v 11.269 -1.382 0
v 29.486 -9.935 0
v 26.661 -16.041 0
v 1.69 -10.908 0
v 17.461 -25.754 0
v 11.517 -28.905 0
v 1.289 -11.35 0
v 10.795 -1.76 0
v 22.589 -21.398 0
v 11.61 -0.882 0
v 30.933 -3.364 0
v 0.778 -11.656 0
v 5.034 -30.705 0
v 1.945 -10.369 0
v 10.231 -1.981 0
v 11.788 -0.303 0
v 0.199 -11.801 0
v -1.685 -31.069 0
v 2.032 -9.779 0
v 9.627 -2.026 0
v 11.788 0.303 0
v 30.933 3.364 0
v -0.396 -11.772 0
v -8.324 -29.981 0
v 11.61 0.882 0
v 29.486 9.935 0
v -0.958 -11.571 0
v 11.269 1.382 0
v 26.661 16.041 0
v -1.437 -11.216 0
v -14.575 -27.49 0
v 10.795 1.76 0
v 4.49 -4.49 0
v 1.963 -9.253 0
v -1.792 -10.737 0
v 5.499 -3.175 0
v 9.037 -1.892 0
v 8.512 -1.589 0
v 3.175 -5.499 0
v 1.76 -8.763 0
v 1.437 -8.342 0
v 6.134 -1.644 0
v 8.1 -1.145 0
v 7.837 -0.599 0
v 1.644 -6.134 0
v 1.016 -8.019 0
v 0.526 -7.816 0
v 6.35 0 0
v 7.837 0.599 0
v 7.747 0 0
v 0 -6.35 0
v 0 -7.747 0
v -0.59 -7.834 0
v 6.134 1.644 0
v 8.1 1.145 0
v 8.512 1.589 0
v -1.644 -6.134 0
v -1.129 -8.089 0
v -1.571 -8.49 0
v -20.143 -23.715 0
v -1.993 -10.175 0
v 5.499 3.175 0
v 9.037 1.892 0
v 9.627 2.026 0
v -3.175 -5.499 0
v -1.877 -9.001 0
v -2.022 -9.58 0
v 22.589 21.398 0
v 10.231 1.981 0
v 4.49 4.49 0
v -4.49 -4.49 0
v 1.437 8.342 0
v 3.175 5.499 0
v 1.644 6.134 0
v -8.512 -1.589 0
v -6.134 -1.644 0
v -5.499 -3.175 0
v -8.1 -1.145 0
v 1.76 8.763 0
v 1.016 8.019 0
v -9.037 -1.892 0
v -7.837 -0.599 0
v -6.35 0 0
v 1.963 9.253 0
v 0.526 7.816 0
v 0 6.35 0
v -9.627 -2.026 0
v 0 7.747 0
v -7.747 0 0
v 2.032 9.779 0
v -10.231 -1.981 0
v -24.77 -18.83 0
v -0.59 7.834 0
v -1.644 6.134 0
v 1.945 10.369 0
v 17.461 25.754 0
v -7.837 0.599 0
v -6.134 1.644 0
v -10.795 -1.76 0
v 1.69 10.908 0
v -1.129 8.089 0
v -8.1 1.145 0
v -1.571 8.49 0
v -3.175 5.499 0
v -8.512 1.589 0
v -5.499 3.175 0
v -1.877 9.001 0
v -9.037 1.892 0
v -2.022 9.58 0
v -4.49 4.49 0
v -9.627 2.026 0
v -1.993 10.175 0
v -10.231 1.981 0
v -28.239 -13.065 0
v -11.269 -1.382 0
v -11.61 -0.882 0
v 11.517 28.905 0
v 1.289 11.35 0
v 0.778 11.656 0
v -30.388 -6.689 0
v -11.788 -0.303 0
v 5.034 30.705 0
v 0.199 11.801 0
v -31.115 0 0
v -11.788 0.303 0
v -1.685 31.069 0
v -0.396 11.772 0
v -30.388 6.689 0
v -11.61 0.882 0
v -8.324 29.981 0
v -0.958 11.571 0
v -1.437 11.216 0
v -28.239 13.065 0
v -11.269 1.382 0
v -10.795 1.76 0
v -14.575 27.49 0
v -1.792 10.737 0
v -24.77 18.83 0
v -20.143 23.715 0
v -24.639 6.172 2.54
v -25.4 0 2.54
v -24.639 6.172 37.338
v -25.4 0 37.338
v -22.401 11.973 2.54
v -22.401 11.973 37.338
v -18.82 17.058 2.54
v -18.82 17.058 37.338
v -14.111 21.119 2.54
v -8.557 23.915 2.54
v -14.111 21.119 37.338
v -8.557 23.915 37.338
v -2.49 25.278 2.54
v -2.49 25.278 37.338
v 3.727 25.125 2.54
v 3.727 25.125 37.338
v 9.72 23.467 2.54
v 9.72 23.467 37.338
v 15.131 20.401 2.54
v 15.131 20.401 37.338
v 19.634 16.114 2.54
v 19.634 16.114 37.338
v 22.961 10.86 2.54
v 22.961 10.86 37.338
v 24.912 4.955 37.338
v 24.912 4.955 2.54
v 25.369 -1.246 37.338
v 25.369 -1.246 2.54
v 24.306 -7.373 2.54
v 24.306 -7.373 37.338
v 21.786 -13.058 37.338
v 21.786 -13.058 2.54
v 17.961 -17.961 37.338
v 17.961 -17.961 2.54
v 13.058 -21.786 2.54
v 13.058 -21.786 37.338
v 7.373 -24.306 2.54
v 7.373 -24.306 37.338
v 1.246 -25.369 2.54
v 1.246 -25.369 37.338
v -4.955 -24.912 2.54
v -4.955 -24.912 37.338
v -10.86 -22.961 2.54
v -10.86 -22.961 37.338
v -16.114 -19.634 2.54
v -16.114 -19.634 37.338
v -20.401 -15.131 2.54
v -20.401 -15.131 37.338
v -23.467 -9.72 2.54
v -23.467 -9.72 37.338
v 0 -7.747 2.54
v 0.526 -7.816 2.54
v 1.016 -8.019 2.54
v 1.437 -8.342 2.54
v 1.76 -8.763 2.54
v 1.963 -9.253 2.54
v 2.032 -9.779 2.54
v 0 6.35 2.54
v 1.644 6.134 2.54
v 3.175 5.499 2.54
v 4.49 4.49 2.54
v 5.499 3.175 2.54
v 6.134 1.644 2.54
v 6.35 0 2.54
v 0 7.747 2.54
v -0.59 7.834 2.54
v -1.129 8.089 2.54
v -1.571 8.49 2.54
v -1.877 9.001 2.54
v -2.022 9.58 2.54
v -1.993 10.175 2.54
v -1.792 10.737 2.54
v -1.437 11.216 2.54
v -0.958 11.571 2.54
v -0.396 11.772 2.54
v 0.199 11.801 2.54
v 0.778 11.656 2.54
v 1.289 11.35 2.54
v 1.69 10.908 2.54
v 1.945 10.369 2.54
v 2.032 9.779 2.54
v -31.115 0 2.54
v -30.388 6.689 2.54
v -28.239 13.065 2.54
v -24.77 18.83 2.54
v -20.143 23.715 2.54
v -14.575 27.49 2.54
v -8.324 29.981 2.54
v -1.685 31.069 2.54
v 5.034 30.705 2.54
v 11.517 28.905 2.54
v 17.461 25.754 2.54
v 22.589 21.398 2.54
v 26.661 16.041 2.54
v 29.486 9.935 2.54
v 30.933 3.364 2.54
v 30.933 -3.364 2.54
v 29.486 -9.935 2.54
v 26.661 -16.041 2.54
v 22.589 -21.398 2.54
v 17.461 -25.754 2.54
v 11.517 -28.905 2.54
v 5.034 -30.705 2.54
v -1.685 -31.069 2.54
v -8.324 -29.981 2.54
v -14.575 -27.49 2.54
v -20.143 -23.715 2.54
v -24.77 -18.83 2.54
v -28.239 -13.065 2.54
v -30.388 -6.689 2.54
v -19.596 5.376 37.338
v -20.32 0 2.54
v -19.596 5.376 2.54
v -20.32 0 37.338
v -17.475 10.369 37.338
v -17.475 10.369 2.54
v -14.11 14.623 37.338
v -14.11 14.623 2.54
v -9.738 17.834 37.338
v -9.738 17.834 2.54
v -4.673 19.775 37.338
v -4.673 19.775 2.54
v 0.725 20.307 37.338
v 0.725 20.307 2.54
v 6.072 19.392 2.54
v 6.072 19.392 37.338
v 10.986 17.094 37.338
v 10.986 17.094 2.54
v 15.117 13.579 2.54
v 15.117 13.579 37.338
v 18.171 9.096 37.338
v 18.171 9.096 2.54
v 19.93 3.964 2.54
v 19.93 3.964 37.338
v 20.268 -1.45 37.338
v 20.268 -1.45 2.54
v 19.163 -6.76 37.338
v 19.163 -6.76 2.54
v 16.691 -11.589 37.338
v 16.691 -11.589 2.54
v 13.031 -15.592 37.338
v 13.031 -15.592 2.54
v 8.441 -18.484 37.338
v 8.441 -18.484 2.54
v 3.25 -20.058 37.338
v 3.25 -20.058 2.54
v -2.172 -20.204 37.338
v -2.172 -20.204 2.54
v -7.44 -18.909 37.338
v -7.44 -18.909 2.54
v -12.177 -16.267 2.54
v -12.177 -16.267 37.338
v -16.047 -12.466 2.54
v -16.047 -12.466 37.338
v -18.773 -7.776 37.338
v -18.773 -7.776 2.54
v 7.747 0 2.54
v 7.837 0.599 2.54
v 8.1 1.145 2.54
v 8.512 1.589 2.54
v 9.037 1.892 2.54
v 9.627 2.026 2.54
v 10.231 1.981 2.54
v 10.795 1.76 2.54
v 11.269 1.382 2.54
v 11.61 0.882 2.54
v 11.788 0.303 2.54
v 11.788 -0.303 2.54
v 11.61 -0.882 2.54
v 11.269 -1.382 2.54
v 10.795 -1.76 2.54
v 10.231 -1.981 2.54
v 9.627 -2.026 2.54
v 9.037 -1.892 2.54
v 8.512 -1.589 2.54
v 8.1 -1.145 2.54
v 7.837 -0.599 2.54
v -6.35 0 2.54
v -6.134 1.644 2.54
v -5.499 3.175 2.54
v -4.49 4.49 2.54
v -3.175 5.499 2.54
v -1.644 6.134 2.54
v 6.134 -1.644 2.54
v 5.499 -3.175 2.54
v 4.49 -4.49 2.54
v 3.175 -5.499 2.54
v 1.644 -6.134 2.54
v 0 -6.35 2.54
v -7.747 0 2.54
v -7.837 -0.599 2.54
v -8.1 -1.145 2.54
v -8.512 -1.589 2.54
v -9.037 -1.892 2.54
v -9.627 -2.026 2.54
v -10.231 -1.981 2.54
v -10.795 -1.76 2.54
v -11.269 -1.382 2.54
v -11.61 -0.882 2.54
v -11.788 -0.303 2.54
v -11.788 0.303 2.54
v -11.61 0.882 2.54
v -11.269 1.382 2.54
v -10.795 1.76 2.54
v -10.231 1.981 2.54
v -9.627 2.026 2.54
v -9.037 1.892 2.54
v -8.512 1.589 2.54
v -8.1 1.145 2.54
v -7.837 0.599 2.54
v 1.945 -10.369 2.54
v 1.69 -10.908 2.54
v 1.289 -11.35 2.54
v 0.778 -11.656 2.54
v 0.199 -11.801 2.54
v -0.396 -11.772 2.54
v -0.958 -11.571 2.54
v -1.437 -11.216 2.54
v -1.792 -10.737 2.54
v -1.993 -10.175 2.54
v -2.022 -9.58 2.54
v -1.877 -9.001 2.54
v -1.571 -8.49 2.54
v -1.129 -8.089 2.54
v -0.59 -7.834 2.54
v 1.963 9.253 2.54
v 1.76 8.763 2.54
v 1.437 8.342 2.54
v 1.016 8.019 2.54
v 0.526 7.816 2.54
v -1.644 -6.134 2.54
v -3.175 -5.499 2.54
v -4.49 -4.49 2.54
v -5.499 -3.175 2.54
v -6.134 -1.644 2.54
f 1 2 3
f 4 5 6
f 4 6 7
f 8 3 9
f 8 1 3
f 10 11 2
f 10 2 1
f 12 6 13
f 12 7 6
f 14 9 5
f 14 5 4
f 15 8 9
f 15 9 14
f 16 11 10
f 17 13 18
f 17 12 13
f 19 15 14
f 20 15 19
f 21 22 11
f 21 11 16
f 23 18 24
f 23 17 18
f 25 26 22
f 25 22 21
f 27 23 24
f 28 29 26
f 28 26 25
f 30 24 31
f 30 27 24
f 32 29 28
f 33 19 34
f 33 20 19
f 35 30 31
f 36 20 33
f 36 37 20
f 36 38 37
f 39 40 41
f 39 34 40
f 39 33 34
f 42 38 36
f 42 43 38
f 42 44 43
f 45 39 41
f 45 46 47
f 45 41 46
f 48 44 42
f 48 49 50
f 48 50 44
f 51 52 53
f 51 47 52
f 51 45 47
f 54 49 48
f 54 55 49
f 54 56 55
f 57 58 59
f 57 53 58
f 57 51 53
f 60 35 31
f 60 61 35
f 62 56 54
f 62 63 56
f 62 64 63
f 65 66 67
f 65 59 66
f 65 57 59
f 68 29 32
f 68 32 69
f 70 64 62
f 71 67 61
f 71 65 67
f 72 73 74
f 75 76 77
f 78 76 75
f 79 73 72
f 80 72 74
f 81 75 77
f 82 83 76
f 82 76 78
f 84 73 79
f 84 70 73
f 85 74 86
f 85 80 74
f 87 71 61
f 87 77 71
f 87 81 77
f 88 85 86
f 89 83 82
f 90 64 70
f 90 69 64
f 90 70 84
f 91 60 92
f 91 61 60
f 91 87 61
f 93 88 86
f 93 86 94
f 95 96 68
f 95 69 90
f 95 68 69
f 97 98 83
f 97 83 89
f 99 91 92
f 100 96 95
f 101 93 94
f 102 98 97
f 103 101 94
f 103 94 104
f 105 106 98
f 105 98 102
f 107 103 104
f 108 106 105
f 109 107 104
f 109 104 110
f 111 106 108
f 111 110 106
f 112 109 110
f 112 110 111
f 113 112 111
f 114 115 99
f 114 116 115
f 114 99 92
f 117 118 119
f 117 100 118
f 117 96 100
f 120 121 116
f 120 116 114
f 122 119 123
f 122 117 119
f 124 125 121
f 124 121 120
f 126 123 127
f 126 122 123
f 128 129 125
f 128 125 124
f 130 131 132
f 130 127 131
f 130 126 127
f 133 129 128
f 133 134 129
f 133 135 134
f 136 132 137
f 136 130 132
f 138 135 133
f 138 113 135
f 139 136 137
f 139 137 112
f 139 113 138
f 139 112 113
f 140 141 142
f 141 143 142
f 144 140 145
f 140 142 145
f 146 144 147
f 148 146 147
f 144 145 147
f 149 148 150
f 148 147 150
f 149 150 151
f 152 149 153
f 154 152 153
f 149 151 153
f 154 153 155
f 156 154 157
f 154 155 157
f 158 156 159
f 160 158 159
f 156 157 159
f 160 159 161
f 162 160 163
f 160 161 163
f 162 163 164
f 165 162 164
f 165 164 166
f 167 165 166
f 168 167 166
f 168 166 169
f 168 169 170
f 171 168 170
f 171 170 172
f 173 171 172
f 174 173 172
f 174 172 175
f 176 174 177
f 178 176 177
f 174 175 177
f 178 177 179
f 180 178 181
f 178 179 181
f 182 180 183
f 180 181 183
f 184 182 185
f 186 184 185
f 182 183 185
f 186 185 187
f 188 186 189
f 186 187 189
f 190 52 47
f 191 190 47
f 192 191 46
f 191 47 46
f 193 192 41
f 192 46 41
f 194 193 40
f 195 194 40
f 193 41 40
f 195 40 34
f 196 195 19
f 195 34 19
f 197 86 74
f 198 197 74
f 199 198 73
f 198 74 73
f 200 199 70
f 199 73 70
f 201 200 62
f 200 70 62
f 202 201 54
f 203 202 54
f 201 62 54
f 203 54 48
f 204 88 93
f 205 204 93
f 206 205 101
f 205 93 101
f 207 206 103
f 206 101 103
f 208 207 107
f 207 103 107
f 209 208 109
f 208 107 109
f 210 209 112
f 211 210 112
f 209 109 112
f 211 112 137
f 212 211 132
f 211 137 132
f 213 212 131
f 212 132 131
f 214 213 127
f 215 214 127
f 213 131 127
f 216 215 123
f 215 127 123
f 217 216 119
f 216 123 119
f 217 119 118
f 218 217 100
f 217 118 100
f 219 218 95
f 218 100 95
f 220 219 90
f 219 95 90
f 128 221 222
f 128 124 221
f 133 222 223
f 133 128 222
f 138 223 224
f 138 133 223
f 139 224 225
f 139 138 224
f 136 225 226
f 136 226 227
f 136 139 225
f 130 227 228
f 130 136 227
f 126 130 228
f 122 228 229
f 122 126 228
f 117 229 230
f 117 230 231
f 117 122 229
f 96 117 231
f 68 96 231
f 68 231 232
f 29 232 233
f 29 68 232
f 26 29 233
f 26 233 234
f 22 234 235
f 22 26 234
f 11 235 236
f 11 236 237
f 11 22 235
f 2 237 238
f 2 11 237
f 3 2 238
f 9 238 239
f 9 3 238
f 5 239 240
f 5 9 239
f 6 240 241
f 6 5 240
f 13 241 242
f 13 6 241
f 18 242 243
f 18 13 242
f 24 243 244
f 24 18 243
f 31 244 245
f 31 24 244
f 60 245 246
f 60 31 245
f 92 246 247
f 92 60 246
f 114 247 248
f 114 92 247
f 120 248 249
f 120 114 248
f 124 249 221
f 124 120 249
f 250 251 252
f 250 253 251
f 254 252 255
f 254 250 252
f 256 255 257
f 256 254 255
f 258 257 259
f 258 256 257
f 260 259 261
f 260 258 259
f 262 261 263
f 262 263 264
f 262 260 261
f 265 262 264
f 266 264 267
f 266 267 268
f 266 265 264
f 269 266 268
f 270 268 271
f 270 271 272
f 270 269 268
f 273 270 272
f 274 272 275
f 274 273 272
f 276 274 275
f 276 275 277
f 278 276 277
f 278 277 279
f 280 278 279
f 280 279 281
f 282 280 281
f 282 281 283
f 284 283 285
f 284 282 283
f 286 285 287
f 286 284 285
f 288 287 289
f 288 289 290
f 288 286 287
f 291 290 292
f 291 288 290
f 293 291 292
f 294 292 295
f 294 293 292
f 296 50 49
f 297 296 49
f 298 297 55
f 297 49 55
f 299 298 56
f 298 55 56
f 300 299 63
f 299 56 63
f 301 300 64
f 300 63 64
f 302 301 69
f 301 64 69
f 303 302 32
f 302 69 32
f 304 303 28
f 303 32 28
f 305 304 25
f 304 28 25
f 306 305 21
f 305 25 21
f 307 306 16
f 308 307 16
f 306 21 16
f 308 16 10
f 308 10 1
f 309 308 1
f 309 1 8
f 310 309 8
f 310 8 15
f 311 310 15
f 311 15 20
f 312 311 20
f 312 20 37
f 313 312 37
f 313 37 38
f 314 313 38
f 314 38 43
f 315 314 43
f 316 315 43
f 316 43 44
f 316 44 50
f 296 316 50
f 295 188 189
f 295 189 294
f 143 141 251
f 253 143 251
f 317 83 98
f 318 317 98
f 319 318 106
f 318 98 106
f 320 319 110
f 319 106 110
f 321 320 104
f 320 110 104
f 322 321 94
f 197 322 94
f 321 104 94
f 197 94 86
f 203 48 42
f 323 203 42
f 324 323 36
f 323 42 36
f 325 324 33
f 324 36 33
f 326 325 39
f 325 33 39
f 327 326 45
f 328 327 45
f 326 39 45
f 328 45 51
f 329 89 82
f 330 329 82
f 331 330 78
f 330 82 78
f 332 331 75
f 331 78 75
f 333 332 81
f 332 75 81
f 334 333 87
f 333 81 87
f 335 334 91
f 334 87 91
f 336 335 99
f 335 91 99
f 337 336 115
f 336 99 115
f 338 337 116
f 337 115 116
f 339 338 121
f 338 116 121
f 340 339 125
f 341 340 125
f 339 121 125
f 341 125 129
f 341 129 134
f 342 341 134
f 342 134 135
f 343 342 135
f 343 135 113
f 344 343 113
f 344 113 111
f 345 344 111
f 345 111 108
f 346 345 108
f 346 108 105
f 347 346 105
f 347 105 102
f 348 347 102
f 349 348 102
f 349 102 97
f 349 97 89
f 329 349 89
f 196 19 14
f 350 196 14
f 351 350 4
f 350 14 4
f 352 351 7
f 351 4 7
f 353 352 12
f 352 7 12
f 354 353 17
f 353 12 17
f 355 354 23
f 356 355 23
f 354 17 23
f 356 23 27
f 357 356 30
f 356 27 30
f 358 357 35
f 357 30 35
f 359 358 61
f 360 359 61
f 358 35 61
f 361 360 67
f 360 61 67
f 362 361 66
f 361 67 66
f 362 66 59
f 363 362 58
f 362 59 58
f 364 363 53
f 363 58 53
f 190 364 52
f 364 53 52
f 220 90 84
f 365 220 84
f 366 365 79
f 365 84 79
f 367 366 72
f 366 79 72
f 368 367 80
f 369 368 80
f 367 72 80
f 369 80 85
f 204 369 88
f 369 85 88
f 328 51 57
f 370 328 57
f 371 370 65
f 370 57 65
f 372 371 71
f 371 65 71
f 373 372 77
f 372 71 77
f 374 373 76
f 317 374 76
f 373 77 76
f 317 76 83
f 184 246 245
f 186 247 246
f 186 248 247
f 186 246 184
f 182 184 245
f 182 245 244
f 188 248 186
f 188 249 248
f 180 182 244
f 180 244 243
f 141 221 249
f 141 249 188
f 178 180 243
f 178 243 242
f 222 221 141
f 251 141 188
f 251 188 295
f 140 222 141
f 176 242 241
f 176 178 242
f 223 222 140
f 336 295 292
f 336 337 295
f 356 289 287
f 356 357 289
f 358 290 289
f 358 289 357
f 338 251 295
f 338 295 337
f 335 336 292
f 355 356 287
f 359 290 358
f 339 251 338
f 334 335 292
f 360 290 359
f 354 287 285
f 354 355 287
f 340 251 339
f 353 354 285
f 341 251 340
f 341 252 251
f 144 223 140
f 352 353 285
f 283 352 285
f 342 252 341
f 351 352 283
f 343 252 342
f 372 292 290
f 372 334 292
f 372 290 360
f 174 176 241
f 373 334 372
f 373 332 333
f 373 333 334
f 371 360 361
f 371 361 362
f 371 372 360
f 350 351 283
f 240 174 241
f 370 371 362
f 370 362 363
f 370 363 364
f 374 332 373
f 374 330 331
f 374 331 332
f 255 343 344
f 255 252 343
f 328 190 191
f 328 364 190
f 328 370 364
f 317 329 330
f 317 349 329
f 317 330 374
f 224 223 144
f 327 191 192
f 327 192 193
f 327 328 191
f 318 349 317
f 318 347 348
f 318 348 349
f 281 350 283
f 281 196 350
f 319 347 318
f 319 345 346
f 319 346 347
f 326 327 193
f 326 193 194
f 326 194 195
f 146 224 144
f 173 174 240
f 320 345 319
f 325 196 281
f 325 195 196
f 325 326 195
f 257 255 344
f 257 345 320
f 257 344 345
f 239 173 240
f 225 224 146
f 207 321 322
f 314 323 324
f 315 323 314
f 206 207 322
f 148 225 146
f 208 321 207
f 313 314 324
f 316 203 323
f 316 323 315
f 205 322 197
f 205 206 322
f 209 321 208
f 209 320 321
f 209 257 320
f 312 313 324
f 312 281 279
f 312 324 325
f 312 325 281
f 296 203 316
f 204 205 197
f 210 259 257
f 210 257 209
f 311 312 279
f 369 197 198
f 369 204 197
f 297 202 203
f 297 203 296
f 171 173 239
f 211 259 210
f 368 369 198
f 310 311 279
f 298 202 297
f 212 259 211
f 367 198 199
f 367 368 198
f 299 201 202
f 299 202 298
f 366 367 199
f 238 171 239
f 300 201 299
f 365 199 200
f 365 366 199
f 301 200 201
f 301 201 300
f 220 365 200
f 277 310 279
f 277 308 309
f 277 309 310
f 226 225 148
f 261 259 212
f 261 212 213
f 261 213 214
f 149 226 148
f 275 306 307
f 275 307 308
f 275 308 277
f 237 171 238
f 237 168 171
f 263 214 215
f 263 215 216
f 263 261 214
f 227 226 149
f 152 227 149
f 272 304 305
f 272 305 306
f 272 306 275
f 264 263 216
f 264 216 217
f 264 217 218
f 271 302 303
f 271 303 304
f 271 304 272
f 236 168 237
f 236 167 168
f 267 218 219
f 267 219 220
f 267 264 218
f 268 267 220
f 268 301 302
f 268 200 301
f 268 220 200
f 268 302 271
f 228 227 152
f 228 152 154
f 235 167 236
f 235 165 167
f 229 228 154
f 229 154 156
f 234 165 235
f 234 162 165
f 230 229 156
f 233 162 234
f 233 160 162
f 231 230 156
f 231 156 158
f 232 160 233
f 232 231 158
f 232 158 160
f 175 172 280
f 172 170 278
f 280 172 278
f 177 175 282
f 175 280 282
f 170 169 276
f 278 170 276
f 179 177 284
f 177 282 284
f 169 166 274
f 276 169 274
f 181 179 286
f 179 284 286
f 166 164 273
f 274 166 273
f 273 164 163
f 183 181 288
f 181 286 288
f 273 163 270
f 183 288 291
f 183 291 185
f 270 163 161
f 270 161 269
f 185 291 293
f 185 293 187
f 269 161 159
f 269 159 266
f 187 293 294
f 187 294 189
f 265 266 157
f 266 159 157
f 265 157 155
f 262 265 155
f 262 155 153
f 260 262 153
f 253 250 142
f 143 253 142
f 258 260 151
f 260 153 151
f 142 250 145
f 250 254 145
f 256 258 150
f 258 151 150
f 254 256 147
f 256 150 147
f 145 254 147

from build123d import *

# Parameters (mm, degrees)
F0_W     = 5.08
F0_H     = 34.798
F1_ANGLE = 337.5
F3_R     = 2.032
F4_DEPTH = 10.60485


with BuildPart() as f1:
    # F0 (on Front) → F1 (revolve)
    with BuildSketch(Plane.XZ):
        with Locations((-22.86, 19.939)):
            Rectangle(F0_W, F0_H)
    revolve(axis=Axis((0, 0, 19.939), (0, 0, -1)), revolution_arc=F1_ANGLE)

    # F0 (on Front) → F2 (revolve)
    with BuildSketch(Plane.XZ):
        Polygon((-31.115, 0), (0, 0), (0, 2.54), (-20.32, 2.54), (-25.4, 2.54), (-31.115, 2.54), align=None)
    revolve(axis=Axis((0, 0, 19.939), (0, 0, -1)))

    # F3 (on face) → F4 (cut)
    with BuildSketch(Plane(origin=(0, 0, 0), x_dir=(1, 0, 0), z_dir=(0, 0, -1))):
        with BuildLine():
            Line((0, 0), (6.35, 0))
            ThreePointArc((6.35, 0), (4.490128, 4.490128), (0, 6.35))
            Line((0, 6.35), (0, 0))
        make_face()
        with BuildLine():
            ThreePointArc((2.032, -9.779), (1.436841, -8.342159), (0, -7.747))
            ThreePointArc((0, -7.747), (-1.436841, -11.215841), (2.032, -9.779))
        make_face()
        with Locations((-9.779, 0)):
            Circle(F3_R)
        with BuildLine():
            ThreePointArc((2.032, 9.779), (-1.436841, 11.215841), (0, 7.747))
            ThreePointArc((0, 7.747), (1.436841, 8.342159), (2.032, 9.779))
        make_face()
        with BuildLine():
            ThreePointArc((0, -6.35), (4.490128, -4.490128), (6.35, 0))
            Line((6.35, 0), (0, 0))
            Line((0, 0), (0, -6.35))
        make_face()
        with BuildLine():
            ThreePointArc((11.811, 0), (9.779, 2.032), (7.747, 0))
            ThreePointArc((7.747, 0), (9.779, -2.032), (11.811, 0))
        make_face()
        with BuildLine():
            Line((0, 0), (0, 6.35))
            ThreePointArc((0, 6.35), (-4.490128, 4.490128), (-6.35, 0))
            Line((-6.35, 0), (0, 0))
        make_face()
        with BuildLine():
            ThreePointArc((-6.35, 0), (-4.490128, -4.490128), (0, -6.35))
            Line((0, -6.35), (0, 0))
            Line((0, 0), (-6.35, 0))
        make_face()
    extrude(amount=-F4_DEPTH, mode=Mode.SUBTRACT)


solid = f1.part
